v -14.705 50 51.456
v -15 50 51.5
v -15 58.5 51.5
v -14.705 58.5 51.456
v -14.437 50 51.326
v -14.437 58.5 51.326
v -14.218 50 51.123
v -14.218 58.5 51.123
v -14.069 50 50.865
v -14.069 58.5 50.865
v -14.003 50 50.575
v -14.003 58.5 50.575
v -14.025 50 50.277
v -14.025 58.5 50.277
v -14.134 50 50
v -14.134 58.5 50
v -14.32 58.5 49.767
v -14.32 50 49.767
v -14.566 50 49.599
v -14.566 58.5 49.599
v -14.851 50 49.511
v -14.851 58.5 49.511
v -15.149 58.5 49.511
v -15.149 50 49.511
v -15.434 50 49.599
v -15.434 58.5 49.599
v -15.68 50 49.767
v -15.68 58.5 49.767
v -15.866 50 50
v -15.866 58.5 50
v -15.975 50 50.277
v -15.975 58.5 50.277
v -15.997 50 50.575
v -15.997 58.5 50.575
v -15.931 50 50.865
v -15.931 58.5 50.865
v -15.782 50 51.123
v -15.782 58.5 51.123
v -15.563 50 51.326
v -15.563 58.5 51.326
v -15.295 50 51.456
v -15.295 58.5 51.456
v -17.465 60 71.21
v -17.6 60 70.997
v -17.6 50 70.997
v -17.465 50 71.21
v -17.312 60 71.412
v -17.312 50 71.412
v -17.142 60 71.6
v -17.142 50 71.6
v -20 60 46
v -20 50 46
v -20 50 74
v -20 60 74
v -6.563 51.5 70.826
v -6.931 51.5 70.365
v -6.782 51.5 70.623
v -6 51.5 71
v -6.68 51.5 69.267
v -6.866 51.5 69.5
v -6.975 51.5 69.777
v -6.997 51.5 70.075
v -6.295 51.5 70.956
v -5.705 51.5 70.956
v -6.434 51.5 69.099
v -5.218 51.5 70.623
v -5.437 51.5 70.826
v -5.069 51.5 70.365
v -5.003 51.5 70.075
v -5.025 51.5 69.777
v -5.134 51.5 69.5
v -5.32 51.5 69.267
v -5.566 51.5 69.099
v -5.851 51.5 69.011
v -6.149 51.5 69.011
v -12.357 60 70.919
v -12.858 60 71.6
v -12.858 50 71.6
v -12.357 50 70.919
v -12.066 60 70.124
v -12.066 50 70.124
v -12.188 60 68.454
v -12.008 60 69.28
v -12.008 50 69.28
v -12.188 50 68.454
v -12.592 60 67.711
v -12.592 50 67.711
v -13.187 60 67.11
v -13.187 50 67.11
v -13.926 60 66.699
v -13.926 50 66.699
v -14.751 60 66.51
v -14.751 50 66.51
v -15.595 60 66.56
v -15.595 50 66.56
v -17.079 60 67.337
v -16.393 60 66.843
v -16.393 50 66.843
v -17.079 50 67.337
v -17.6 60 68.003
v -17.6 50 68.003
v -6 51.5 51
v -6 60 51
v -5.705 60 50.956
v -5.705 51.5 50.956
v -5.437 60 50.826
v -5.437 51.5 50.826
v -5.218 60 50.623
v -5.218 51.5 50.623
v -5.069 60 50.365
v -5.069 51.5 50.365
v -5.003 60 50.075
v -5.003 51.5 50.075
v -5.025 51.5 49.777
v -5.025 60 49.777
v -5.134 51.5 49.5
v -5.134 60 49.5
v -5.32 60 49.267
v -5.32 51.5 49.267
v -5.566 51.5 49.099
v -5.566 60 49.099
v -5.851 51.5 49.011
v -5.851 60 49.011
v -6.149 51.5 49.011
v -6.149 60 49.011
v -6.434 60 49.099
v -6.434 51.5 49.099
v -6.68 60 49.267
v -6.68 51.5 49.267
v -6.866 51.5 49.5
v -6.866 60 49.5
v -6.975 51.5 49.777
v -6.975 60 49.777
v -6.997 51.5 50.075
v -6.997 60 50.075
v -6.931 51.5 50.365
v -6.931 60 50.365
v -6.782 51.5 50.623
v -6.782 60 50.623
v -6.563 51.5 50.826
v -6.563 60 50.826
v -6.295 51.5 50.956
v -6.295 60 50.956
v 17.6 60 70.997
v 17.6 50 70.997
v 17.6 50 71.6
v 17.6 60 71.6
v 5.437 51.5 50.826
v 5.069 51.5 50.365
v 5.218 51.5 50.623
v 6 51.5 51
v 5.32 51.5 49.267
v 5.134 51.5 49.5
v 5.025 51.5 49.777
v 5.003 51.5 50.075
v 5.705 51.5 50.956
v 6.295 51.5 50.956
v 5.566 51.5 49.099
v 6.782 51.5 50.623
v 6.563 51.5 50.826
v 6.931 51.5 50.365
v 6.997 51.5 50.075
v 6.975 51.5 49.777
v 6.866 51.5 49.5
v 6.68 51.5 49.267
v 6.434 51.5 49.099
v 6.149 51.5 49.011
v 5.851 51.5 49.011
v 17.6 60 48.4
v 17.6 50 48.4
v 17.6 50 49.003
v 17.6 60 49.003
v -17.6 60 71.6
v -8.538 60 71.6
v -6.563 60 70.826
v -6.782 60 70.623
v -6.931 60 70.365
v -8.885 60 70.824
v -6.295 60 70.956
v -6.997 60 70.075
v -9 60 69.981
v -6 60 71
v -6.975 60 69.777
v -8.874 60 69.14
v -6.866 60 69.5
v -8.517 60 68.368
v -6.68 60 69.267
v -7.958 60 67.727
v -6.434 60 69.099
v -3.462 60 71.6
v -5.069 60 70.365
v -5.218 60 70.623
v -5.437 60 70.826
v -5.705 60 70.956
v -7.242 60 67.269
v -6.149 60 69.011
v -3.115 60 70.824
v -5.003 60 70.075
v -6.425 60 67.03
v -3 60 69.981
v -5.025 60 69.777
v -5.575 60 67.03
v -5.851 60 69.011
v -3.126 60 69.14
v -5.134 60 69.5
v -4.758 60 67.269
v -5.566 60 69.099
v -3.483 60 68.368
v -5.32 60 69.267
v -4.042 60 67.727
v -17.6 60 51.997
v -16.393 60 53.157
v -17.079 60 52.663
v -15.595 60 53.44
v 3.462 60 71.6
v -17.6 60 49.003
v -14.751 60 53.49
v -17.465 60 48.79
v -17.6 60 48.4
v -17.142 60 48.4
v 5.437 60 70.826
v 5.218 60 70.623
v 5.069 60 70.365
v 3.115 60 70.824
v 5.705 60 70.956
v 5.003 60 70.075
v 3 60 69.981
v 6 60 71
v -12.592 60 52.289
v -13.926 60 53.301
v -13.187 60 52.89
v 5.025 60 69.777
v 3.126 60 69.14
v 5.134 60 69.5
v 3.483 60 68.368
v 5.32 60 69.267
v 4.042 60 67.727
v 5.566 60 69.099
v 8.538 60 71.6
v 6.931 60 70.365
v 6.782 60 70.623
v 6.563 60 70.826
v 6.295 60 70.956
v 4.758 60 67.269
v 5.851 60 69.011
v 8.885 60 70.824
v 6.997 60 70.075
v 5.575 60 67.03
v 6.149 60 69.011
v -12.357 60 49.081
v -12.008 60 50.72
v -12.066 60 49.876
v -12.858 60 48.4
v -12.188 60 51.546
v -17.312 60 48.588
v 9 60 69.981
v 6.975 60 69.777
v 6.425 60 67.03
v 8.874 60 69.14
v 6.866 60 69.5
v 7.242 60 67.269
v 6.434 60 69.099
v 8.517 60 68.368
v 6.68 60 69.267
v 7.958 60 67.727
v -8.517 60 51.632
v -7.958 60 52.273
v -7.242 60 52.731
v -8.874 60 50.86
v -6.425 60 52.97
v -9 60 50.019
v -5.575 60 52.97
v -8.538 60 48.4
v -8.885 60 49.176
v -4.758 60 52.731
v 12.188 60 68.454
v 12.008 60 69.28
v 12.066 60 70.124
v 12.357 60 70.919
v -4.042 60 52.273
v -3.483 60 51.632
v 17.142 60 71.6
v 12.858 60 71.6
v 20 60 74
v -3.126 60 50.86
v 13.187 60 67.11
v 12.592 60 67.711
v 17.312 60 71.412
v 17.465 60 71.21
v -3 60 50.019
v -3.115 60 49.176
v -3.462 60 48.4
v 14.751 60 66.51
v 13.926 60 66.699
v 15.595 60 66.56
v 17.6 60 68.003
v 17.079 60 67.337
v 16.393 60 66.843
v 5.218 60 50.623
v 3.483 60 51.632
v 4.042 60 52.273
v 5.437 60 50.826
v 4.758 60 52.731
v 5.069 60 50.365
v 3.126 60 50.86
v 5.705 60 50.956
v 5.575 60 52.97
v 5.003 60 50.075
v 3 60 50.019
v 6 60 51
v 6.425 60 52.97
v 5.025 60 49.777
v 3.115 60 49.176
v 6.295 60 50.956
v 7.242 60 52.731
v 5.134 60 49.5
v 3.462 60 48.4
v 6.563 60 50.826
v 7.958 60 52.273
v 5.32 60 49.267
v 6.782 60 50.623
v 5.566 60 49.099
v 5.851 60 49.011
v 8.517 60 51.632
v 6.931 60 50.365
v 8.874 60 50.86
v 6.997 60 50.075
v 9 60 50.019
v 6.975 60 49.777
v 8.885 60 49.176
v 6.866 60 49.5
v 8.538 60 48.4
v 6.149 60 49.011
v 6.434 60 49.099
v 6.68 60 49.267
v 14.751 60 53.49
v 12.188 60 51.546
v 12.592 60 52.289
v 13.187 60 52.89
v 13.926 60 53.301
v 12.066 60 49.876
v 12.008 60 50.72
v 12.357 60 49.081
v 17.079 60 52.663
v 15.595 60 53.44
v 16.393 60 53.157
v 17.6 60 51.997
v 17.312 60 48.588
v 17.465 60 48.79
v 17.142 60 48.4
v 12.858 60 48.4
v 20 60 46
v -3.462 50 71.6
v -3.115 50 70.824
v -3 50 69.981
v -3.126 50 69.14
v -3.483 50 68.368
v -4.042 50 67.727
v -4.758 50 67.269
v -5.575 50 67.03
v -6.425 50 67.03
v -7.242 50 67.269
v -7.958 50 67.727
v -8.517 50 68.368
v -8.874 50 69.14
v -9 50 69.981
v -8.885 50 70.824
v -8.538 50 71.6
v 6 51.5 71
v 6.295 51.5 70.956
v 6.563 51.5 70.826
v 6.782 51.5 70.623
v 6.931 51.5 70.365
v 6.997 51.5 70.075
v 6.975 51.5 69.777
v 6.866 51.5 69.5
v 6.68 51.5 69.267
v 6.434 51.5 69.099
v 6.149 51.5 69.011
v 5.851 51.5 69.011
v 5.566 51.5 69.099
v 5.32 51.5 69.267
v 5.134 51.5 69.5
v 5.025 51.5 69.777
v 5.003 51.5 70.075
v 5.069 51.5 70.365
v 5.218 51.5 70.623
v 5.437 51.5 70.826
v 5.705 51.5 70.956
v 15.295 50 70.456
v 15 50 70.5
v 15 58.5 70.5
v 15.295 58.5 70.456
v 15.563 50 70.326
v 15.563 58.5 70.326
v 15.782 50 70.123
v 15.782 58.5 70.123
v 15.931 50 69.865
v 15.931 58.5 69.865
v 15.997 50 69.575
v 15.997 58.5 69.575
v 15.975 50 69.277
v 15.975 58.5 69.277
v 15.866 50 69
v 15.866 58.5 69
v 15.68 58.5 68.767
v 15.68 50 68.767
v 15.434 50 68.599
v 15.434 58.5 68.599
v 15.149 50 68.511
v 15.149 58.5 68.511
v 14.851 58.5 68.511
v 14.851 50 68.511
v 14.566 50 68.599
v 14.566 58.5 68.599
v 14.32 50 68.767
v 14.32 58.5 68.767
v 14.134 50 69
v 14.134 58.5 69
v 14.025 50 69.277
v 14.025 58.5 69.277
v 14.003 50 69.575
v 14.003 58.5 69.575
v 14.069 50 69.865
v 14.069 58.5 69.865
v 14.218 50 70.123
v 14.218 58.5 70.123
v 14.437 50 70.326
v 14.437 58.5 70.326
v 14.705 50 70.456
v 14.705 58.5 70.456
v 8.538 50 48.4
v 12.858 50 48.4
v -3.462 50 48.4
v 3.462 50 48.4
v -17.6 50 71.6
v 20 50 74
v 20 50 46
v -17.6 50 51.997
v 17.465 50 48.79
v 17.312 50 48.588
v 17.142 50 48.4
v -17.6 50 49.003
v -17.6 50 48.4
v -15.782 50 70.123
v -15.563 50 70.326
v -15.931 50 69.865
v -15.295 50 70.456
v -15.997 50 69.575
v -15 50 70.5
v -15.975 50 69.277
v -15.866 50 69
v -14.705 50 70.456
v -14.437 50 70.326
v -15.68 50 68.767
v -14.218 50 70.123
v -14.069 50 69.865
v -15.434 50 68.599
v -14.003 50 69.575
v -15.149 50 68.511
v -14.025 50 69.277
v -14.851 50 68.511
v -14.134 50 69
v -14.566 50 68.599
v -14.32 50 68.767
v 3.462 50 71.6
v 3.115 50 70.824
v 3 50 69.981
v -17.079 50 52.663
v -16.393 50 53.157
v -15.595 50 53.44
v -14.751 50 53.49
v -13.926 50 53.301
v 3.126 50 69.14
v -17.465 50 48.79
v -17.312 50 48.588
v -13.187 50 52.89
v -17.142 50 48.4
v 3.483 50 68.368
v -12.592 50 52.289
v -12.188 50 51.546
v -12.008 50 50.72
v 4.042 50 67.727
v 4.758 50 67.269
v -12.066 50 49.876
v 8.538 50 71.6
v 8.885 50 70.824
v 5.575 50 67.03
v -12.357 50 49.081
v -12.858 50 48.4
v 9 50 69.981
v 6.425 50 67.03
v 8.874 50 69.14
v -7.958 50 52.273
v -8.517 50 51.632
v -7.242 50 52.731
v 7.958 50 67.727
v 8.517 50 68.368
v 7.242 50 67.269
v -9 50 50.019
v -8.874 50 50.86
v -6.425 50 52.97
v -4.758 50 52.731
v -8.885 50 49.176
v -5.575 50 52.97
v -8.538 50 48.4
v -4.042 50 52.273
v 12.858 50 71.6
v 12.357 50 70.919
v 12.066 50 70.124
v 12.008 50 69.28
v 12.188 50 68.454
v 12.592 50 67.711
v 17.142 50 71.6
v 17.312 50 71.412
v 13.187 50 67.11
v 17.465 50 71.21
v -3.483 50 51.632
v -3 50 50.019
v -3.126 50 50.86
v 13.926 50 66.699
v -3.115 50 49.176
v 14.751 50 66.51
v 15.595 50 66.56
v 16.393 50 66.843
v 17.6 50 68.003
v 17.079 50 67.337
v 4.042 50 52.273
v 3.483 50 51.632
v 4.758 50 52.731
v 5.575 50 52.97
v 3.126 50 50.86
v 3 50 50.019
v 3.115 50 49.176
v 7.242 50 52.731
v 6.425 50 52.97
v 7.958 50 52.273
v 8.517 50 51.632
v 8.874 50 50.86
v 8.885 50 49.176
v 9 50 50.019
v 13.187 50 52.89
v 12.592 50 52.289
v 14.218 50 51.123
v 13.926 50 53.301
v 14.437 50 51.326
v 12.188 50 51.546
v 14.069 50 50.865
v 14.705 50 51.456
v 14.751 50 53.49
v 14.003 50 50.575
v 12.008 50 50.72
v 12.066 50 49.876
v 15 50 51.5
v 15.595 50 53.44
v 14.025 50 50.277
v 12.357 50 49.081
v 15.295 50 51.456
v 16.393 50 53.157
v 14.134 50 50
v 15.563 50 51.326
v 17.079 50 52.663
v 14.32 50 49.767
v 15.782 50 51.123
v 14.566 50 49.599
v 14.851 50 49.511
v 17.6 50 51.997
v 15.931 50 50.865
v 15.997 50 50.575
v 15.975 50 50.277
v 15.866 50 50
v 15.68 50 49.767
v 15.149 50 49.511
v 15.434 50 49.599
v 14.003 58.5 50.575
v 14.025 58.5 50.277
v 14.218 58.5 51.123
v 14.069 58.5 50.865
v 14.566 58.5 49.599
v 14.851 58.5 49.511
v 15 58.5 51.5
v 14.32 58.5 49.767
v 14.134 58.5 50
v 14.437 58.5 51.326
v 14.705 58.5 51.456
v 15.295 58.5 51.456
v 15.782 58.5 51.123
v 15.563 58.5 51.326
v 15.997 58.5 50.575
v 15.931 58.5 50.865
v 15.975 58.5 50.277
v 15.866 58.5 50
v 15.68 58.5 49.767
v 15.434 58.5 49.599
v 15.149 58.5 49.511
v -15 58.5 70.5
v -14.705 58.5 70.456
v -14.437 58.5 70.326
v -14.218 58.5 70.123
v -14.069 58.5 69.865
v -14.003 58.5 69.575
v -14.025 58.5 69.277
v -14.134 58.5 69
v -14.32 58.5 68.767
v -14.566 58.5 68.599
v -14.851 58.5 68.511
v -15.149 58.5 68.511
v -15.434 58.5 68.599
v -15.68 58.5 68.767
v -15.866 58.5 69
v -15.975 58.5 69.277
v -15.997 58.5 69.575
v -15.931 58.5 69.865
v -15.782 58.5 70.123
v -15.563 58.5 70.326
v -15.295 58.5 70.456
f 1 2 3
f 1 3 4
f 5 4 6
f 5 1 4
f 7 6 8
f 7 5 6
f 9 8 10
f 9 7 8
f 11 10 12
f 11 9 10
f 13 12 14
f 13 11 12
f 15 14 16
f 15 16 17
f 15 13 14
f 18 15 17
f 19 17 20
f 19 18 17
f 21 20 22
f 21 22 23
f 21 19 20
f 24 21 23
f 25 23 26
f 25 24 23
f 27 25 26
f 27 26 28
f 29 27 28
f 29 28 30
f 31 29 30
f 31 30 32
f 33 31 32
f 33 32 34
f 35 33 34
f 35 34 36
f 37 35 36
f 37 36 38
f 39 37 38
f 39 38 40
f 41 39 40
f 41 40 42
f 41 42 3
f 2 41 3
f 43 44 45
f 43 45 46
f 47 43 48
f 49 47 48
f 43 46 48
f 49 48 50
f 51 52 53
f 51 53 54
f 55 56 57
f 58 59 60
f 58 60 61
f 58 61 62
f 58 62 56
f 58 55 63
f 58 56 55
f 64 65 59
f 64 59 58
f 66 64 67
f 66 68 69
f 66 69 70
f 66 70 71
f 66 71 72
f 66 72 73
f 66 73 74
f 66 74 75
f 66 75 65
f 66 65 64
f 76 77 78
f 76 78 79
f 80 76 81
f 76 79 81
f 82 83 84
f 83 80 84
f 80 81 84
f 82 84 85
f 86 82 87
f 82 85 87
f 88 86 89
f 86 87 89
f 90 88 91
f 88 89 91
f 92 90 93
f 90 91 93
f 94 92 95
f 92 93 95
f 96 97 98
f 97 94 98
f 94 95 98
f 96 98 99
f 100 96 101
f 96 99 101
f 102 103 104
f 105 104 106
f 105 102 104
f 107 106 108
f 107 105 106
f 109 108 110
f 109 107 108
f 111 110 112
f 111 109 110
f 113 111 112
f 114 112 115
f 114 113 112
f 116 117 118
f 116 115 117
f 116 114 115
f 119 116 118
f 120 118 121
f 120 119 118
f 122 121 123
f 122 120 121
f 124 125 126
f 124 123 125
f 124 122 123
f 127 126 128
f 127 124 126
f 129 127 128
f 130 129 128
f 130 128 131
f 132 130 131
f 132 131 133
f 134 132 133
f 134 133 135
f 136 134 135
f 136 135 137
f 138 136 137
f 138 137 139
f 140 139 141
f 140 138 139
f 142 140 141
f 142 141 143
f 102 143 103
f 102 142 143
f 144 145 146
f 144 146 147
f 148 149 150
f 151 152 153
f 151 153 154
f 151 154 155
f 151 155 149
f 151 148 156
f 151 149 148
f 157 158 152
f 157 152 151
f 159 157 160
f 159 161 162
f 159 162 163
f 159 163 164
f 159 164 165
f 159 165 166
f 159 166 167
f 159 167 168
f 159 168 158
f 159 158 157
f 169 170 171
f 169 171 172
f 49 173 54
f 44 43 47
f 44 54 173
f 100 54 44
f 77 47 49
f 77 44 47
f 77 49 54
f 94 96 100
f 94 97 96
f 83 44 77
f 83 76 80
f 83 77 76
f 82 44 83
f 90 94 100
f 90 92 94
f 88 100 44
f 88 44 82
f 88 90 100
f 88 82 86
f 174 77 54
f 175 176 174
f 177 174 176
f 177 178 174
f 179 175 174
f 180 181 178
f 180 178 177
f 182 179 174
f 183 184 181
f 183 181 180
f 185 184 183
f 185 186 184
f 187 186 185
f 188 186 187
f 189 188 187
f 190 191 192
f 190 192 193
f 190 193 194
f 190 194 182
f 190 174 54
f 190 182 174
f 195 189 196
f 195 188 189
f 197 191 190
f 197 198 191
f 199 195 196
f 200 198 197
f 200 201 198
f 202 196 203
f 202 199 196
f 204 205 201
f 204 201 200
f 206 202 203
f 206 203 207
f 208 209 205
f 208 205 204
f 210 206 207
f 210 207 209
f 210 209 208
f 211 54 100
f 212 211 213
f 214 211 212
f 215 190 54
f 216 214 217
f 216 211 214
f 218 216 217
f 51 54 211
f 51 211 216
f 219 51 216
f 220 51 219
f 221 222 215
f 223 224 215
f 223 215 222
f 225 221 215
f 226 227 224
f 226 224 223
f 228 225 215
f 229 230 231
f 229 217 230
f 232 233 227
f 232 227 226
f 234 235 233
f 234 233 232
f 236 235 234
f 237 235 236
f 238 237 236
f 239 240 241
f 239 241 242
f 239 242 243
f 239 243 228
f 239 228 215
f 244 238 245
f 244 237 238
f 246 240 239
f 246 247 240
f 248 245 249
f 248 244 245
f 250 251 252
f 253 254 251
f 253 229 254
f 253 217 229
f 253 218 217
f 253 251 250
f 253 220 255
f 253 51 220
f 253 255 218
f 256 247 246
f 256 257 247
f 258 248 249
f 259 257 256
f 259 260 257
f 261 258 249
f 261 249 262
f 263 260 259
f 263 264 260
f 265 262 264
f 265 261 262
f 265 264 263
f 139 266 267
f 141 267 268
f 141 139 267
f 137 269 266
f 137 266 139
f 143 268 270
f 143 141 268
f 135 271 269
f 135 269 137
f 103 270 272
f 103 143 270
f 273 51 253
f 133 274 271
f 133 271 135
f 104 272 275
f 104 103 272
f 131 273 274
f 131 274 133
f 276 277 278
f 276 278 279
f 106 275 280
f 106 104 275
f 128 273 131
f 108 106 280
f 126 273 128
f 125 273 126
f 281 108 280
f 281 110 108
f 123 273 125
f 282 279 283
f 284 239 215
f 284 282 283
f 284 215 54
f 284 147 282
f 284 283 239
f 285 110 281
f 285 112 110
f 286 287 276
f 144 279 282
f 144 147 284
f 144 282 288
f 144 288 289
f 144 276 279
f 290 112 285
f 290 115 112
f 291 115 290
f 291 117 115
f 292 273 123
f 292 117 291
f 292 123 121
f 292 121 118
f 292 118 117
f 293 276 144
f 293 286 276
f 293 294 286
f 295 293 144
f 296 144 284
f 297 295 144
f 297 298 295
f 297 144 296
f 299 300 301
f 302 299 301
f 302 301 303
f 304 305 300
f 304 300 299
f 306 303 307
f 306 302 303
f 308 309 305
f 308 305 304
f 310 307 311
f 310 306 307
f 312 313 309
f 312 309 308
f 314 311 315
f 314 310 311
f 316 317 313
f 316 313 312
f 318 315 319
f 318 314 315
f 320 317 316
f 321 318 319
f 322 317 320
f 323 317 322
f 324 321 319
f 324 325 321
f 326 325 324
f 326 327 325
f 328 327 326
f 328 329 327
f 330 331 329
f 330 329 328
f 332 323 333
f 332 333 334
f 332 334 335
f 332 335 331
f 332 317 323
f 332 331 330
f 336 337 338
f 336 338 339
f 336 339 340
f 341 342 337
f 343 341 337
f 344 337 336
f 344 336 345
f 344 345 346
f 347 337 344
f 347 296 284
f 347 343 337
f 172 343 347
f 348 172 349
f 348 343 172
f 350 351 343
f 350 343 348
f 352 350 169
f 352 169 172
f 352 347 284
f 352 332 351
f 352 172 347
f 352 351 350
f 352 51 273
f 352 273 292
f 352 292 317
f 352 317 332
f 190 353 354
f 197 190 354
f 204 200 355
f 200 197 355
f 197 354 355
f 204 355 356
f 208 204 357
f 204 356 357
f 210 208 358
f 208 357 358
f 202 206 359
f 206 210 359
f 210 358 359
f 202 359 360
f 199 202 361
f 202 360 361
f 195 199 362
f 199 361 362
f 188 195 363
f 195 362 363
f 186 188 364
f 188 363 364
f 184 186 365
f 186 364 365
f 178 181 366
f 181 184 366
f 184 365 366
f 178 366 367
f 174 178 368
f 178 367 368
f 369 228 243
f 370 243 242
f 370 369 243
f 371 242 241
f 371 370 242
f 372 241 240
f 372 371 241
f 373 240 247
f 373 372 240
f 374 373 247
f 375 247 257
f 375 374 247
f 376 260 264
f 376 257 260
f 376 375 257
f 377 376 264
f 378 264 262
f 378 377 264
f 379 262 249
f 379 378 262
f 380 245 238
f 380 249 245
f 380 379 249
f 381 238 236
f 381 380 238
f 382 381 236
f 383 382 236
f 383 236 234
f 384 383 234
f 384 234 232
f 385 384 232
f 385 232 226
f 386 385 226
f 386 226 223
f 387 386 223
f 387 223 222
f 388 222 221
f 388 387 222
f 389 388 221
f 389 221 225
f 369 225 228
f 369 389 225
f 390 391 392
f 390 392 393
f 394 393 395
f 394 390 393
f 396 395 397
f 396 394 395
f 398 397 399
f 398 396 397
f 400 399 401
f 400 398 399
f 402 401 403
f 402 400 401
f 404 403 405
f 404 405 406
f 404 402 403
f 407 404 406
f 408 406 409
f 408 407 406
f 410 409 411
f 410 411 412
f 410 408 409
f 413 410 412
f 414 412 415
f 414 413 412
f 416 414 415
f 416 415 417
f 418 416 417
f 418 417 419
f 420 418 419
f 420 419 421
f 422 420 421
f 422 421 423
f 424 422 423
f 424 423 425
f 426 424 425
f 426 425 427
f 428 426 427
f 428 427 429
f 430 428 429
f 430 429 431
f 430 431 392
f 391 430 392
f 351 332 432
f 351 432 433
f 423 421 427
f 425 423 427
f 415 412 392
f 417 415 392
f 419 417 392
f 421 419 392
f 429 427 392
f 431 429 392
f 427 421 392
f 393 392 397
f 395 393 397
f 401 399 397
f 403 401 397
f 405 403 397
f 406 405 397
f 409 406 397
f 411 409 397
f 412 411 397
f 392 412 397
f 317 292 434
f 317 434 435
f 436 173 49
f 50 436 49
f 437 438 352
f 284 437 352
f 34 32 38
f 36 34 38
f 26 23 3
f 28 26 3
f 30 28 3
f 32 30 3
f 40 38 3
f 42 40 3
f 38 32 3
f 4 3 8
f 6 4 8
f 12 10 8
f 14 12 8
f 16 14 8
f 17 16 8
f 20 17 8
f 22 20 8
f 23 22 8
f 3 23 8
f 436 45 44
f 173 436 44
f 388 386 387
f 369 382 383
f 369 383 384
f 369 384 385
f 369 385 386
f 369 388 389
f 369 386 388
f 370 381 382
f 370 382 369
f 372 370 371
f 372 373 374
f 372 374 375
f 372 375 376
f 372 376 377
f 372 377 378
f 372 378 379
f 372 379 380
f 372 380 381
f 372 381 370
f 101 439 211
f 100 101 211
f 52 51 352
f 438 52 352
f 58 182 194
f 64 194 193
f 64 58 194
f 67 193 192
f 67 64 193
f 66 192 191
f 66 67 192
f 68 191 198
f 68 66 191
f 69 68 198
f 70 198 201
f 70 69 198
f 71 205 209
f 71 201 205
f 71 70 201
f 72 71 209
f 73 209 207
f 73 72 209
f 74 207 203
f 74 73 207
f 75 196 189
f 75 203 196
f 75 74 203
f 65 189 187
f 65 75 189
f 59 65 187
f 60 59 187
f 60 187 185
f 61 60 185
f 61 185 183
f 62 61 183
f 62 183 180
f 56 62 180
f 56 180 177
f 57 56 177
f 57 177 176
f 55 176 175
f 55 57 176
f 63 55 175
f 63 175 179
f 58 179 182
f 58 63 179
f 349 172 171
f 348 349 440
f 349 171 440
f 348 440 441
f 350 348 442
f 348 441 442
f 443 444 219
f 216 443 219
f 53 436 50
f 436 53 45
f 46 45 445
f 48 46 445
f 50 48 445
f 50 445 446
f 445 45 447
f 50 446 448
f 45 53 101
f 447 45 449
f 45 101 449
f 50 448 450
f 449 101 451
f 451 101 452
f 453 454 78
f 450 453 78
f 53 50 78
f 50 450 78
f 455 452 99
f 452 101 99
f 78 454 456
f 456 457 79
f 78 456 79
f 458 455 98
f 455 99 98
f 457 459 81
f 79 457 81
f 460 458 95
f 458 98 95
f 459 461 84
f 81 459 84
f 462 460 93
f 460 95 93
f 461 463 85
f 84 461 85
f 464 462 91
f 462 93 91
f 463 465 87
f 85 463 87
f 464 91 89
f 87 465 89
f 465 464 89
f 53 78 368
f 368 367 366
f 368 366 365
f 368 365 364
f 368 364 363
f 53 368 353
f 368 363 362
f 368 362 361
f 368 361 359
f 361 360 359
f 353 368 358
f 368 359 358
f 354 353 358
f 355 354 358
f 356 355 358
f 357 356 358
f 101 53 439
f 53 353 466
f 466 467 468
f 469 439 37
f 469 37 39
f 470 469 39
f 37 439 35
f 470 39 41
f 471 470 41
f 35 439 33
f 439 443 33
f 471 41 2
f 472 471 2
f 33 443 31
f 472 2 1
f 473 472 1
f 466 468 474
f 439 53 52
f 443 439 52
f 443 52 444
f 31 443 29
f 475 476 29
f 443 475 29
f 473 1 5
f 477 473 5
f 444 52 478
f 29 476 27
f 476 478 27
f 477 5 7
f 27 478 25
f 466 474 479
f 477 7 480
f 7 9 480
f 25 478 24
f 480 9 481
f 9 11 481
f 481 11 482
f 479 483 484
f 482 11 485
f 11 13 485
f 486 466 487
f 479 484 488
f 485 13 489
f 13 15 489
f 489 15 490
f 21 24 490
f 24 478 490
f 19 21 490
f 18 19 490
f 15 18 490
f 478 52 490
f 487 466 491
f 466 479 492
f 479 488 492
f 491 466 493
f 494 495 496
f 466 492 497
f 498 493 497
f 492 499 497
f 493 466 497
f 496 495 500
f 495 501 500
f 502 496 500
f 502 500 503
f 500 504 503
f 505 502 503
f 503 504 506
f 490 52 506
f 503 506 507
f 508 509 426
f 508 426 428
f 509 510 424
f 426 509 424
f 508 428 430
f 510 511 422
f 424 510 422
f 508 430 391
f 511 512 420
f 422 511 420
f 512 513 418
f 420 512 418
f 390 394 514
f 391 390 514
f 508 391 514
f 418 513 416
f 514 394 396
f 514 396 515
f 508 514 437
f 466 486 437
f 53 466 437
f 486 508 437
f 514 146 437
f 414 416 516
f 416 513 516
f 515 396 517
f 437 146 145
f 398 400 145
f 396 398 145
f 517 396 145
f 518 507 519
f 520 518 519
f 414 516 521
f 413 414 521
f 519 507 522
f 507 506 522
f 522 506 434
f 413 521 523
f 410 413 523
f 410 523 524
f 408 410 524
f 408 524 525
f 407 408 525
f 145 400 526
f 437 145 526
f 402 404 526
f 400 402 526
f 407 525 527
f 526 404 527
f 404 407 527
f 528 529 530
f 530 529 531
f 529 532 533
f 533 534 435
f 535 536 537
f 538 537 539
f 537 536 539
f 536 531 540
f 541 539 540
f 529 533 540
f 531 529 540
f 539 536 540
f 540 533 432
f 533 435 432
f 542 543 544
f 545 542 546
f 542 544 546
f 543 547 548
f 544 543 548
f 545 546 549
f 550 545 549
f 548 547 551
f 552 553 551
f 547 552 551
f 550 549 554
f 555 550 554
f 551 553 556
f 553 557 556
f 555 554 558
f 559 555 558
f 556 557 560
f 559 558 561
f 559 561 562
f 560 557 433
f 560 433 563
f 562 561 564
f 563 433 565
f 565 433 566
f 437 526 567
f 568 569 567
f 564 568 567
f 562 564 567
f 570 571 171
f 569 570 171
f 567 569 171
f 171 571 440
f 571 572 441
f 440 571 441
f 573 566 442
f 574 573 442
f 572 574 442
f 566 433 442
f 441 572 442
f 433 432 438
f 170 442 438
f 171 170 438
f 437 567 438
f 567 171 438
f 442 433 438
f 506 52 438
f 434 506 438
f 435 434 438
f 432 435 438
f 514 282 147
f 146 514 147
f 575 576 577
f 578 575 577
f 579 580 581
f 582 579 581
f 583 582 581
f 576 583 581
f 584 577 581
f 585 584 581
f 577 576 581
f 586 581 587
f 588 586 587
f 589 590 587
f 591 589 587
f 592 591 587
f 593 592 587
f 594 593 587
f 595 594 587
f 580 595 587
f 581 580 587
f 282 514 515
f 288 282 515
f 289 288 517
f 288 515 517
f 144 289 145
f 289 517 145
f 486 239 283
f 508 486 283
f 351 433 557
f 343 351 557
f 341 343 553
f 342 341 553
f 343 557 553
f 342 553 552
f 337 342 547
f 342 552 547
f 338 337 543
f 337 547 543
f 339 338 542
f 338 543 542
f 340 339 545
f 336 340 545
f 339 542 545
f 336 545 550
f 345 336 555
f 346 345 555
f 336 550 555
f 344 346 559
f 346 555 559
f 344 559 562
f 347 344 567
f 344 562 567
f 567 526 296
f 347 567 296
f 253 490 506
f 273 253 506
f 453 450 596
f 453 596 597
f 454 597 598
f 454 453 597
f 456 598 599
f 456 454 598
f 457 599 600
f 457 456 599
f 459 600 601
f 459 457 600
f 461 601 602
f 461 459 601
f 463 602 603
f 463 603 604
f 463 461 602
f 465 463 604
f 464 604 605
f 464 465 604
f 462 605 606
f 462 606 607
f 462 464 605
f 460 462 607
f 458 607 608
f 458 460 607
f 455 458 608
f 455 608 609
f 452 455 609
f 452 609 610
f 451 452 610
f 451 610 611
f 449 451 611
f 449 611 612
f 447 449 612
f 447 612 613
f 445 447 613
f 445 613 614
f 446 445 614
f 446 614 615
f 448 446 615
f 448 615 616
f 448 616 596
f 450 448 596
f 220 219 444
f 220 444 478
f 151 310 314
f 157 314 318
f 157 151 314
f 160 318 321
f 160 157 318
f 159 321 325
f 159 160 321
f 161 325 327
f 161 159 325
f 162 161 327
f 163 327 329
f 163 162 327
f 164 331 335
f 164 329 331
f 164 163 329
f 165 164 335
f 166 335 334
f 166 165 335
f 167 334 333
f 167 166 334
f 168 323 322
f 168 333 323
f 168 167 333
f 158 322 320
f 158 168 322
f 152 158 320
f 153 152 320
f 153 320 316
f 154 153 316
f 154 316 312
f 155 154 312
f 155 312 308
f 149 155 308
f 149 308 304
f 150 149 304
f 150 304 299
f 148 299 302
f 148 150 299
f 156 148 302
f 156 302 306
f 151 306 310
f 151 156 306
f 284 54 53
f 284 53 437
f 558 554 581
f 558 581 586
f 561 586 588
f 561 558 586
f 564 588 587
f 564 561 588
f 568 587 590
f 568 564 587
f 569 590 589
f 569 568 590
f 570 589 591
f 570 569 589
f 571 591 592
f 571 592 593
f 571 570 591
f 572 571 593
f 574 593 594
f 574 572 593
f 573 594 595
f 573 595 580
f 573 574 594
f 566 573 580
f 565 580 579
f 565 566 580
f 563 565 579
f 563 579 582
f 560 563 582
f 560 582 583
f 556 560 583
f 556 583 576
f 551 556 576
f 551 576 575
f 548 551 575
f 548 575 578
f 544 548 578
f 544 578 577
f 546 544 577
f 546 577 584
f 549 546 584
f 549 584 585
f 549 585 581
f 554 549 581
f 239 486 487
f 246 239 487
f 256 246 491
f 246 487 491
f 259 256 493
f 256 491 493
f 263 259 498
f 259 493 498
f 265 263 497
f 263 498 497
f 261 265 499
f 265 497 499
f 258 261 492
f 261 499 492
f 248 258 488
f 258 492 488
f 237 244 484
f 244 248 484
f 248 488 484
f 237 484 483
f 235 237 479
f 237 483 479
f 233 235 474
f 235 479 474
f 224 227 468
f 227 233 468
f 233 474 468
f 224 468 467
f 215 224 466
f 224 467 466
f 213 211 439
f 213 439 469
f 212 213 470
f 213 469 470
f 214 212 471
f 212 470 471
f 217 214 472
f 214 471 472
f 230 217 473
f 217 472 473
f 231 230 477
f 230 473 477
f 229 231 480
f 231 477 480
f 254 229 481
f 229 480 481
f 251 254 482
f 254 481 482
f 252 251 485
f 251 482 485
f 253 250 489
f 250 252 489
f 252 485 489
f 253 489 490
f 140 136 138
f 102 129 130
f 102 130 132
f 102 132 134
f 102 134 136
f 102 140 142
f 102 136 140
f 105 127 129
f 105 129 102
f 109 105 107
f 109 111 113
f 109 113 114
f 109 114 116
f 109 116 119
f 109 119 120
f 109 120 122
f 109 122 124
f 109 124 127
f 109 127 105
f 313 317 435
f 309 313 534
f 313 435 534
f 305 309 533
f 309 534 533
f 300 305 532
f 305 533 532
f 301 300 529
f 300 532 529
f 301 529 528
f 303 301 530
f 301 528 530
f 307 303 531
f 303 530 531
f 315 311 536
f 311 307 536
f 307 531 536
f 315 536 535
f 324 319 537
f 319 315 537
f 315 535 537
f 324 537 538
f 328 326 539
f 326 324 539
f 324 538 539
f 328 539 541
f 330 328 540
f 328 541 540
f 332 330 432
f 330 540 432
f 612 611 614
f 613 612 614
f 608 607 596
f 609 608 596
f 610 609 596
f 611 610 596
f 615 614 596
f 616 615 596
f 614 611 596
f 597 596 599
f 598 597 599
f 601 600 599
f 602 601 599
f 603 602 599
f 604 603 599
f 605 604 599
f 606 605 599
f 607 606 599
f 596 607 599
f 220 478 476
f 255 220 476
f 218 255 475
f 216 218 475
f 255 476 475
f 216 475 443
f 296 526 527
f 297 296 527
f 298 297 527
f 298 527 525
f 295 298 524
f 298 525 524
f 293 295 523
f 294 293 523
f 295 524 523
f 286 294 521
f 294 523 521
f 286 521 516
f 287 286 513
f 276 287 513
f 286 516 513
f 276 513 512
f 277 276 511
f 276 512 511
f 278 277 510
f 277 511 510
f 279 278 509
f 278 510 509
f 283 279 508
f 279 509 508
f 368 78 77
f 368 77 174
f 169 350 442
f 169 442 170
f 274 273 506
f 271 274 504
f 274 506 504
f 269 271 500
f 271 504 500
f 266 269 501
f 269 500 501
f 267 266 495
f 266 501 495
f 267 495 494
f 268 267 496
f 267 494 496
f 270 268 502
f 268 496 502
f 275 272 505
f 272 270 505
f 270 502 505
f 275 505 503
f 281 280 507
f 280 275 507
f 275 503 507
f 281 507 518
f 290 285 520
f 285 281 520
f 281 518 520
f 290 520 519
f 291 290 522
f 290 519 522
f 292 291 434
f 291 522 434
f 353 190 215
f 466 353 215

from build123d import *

# Parameters (mm, degrees)
BOSS_EXTRUDE1_START  = 46
SKETCH1_W            = 40
SKETCH1_H            = 10
BOSS_EXTRUDE1_DEPTH  = 28
BOSS_EXTRUDE2_START  = 48.4
SKETCH2_W            = 35.2
SKETCH2_H            = 12
BOSS_EXTRUDE2_DEPTH  = 23.2
BOSS_EXTRUDE3_START  = 50
SKETCH3_R            = 3
BOSS_EXTRUDE3_DEPTH  = 10
BOSS_EXTRUDE4_START  = 50
SKETCH4_R            = 3
BOSS_EXTRUDE4_DEPTH  = 10
BOSS_EXTRUDE5_START  = 50
SKETCH5_R            = 3
BOSS_EXTRUDE5_DEPTH  = 10
BOSS_EXTRUDE6_START  = 50
SKETCH6_R            = 3
BOSS_EXTRUDE6_DEPTH  = 10
BOSS_EXTRUDE7_START  = 50
SKETCH7_R            = 3
BOSS_EXTRUDE7_DEPTH  = 10
BOSS_EXTRUDE8_START  = 50
SKETCH8_R            = 3
BOSS_EXTRUDE8_DEPTH  = 10
BOSS_EXTRUDE9_START  = 50
SKETCH9_R            = 3
BOSS_EXTRUDE9_DEPTH  = 10
BOSS_EXTRUDE10_START = 50
SKETCH10_R           = 3
BOSS_EXTRUDE10_DEPTH = 10
BOSS_EXTRUDE11_START = 49
SKETCH11_R           = 1
BOSS_EXTRUDE11_DEPTH = 9.5
BOSS_EXTRUDE12_START = 49
SKETCH12_R           = 1
BOSS_EXTRUDE12_DEPTH = 9.5
BOSS_EXTRUDE13_START = 49
SKETCH13_R           = 1
BOSS_EXTRUDE13_DEPTH = 9.5
BOSS_EXTRUDE14_START = 49
SKETCH14_R           = 1
BOSS_EXTRUDE14_DEPTH = 9.5
BOSS_EXTRUDE15_START = 51.5
SKETCH15_R           = 1
BOSS_EXTRUDE15_DEPTH = 9.5
BOSS_EXTRUDE16_START = 51.5
SKETCH16_R           = 1
BOSS_EXTRUDE16_DEPTH = 9.5
BOSS_EXTRUDE17_START = 51.5
SKETCH17_R           = 1
BOSS_EXTRUDE17_DEPTH = 9.5
BOSS_EXTRUDE18_START = 51.5
SKETCH18_R           = 1
BOSS_EXTRUDE18_DEPTH = 9.5


with BuildPart() as part:
    # Sketch1 → Boss-Extrude1 (new body)
    with BuildSketch(Plane.XY.offset(BOSS_EXTRUDE1_START)):
        with Locations((0, 55)):
            Rectangle(SKETCH1_W, SKETCH1_H)
    extrude(amount=BOSS_EXTRUDE1_DEPTH)


with BuildPart() as body_2:
    # Sketch2 → Boss-Extrude2 (new body)
    with BuildSketch(Plane.XY.offset(BOSS_EXTRUDE2_START)):
        with Locations((0, 55)):
            Rectangle(SKETCH2_W, SKETCH2_H)
    extrude(amount=BOSS_EXTRUDE2_DEPTH)


with BuildPart() as part_1:
    add(part.part)

    # Combine1: cut body 2
    add(body_2.part, mode=Mode.SUBTRACT)

    # Sketch3 → Boss-Extrude3 (add)
    with BuildSketch(Plane(origin=(0, 0, 0), x_dir=(1, 0, 0), z_dir=(0, 1, 0)).offset(BOSS_EXTRUDE3_START)):
        with Locations((-15, -50.5)):
            Circle(SKETCH3_R)
    extrude(amount=BOSS_EXTRUDE3_DEPTH)

    # Sketch4 → Boss-Extrude4 (add)
    with BuildSketch(Plane(origin=(0, 0, 0), x_dir=(1, 0, 0), z_dir=(0, 1, 0)).offset(BOSS_EXTRUDE4_START)):
        with Locations((-15, -69.5)):
            Circle(SKETCH4_R)
    extrude(amount=BOSS_EXTRUDE4_DEPTH)

    # Sketch5 → Boss-Extrude5 (add)
    with BuildSketch(Plane(origin=(0, 0, 0), x_dir=(1, 0, 0), z_dir=(0, 1, 0)).offset(BOSS_EXTRUDE5_START)):
        with Locations((15, -50.5)):
            Circle(SKETCH5_R)
    extrude(amount=BOSS_EXTRUDE5_DEPTH)

    # Sketch6 → Boss-Extrude6 (add)
    with BuildSketch(Plane(origin=(0, 0, 0), x_dir=(1, 0, 0), z_dir=(0, 1, 0)).offset(BOSS_EXTRUDE6_START)):
        with Locations((15, -69.5)):
            Circle(SKETCH6_R)
    extrude(amount=BOSS_EXTRUDE6_DEPTH)

    # Sketch7 → Boss-Extrude7 (add)
    with BuildSketch(Plane(origin=(0, 0, 0), x_dir=(1, 0, 0), z_dir=(0, 1, 0)).offset(BOSS_EXTRUDE7_START)):
        with Locations((-6, -50)):
            Circle(SKETCH7_R)
    extrude(amount=BOSS_EXTRUDE7_DEPTH)

    # Sketch8 → Boss-Extrude8 (add)
    with BuildSketch(Plane(origin=(0, 0, 0), x_dir=(1, 0, 0), z_dir=(0, 1, 0)).offset(BOSS_EXTRUDE8_START)):
        with Locations((-6, -70)):
            Circle(SKETCH8_R)
    extrude(amount=BOSS_EXTRUDE8_DEPTH)

    # Sketch9 → Boss-Extrude9 (add)
    with BuildSketch(Plane(origin=(0, 0, 0), x_dir=(1, 0, 0), z_dir=(0, 1, 0)).offset(BOSS_EXTRUDE9_START)):
        with Locations((6, -50)):
            Circle(SKETCH9_R)
    extrude(amount=BOSS_EXTRUDE9_DEPTH)

    # Sketch10 → Boss-Extrude10 (add)
    with BuildSketch(Plane(origin=(0, 0, 0), x_dir=(1, 0, 0), z_dir=(0, 1, 0)).offset(BOSS_EXTRUDE10_START)):
        with Locations((6, -70)):
            Circle(SKETCH10_R)
    extrude(amount=BOSS_EXTRUDE10_DEPTH)


with BuildPart() as body_2_2:
    # Sketch11 → Boss-Extrude11 (new body)
    with BuildSketch(Plane(origin=(0, 0, 0), x_dir=(1, 0, 0), z_dir=(0, 1, 0)).offset(BOSS_EXTRUDE11_START)):
        with Locations(Location((-15, -50.5, 0), (0, 0, 270))):
            Circle(SKETCH11_R)
    extrude(amount=BOSS_EXTRUDE11_DEPTH)


with BuildPart() as part_2:
    add(part_1.part)

    # Combine2: cut body 2 2
    add(body_2_2.part, mode=Mode.SUBTRACT)


with BuildPart() as body_2_3:
    # Sketch12 → Boss-Extrude12 (new body)
    with BuildSketch(Plane(origin=(0, 0, 0), x_dir=(1, 0, 0), z_dir=(0, 1, 0)).offset(BOSS_EXTRUDE12_START)):
        with Locations(Location((-15, -69.5, 0), (0, 0, 270))):
            Circle(SKETCH12_R)
    extrude(amount=BOSS_EXTRUDE12_DEPTH)


with BuildPart() as part_3:
    add(part_2.part)

    # Combine3: cut body 2 3
    add(body_2_3.part, mode=Mode.SUBTRACT)


with BuildPart() as body_2_4:
    # Sketch13 → Boss-Extrude13 (new body)
    with BuildSketch(Plane(origin=(0, 0, 0), x_dir=(1, 0, 0), z_dir=(0, 1, 0)).offset(BOSS_EXTRUDE13_START)):
        with Locations(Location((15, -50.5, 0), (0, 0, 270))):
            Circle(SKETCH13_R)
    extrude(amount=BOSS_EXTRUDE13_DEPTH)


with BuildPart() as part_4:
    add(part_3.part)

    # Combine4: cut body 2 4
    add(body_2_4.part, mode=Mode.SUBTRACT)


with BuildPart() as body_2_5:
    # Sketch14 → Boss-Extrude14 (new body)
    with BuildSketch(Plane(origin=(0, 0, 0), x_dir=(1, 0, 0), z_dir=(0, 1, 0)).offset(BOSS_EXTRUDE14_START)):
        with Locations(Location((15, -69.5, 0), (0, 0, 270))):
            Circle(SKETCH14_R)
    extrude(amount=BOSS_EXTRUDE14_DEPTH)


with BuildPart() as part_5:
    add(part_4.part)

    # Combine5: cut body 2 5
    add(body_2_5.part, mode=Mode.SUBTRACT)


with BuildPart() as body_2_6:
    # Sketch15 → Boss-Extrude15 (new body)
    with BuildSketch(Plane(origin=(0, 0, 0), x_dir=(1, 0, 0), z_dir=(0, 1, 0)).offset(BOSS_EXTRUDE15_START)):
        with Locations(Location((-6, -50, 0), (0, 0, 270))):
            Circle(SKETCH15_R)
    extrude(amount=BOSS_EXTRUDE15_DEPTH)


with BuildPart() as part_6:
    add(part_5.part)

    # Combine6: cut body 2 6
    add(body_2_6.part, mode=Mode.SUBTRACT)


with BuildPart() as body_2_7:
    # Sketch16 → Boss-Extrude16 (new body)
    with BuildSketch(Plane(origin=(0, 0, 0), x_dir=(1, 0, 0), z_dir=(0, 1, 0)).offset(BOSS_EXTRUDE16_START)):
        with Locations(Location((-6, -70, 0), (0, 0, 270))):
            Circle(SKETCH16_R)
    extrude(amount=BOSS_EXTRUDE16_DEPTH)


with BuildPart() as part_7:
    add(part_6.part)

    # Combine7: cut body 2 7
    add(body_2_7.part, mode=Mode.SUBTRACT)


with BuildPart() as body_2_8:
    # Sketch17 → Boss-Extrude17 (new body)
    with BuildSketch(Plane(origin=(0, 0, 0), x_dir=(1, 0, 0), z_dir=(0, 1, 0)).offset(BOSS_EXTRUDE17_START)):
        with Locations(Location((6, -50, 0), (0, 0, 270))):
            Circle(SKETCH17_R)
    extrude(amount=BOSS_EXTRUDE17_DEPTH)


with BuildPart() as part_8:
    add(part_7.part)

    # Combine8: cut body 2 8
    add(body_2_8.part, mode=Mode.SUBTRACT)


with BuildPart() as body_2_9:
    # Sketch18 → Boss-Extrude18 (new body)
    with BuildSketch(Plane(origin=(0, 0, 0), x_dir=(1, 0, 0), z_dir=(0, 1, 0)).offset(BOSS_EXTRUDE18_START)):
        with Locations(Location((6, -70, 0), (0, 0, 270))):
            Circle(SKETCH18_R)
    extrude(amount=BOSS_EXTRUDE18_DEPTH)


with BuildPart() as part_9:
    add(part_8.part)

    # Combine9: cut body 2 9
    add(body_2_9.part, mode=Mode.SUBTRACT)


solid = part_9.part
